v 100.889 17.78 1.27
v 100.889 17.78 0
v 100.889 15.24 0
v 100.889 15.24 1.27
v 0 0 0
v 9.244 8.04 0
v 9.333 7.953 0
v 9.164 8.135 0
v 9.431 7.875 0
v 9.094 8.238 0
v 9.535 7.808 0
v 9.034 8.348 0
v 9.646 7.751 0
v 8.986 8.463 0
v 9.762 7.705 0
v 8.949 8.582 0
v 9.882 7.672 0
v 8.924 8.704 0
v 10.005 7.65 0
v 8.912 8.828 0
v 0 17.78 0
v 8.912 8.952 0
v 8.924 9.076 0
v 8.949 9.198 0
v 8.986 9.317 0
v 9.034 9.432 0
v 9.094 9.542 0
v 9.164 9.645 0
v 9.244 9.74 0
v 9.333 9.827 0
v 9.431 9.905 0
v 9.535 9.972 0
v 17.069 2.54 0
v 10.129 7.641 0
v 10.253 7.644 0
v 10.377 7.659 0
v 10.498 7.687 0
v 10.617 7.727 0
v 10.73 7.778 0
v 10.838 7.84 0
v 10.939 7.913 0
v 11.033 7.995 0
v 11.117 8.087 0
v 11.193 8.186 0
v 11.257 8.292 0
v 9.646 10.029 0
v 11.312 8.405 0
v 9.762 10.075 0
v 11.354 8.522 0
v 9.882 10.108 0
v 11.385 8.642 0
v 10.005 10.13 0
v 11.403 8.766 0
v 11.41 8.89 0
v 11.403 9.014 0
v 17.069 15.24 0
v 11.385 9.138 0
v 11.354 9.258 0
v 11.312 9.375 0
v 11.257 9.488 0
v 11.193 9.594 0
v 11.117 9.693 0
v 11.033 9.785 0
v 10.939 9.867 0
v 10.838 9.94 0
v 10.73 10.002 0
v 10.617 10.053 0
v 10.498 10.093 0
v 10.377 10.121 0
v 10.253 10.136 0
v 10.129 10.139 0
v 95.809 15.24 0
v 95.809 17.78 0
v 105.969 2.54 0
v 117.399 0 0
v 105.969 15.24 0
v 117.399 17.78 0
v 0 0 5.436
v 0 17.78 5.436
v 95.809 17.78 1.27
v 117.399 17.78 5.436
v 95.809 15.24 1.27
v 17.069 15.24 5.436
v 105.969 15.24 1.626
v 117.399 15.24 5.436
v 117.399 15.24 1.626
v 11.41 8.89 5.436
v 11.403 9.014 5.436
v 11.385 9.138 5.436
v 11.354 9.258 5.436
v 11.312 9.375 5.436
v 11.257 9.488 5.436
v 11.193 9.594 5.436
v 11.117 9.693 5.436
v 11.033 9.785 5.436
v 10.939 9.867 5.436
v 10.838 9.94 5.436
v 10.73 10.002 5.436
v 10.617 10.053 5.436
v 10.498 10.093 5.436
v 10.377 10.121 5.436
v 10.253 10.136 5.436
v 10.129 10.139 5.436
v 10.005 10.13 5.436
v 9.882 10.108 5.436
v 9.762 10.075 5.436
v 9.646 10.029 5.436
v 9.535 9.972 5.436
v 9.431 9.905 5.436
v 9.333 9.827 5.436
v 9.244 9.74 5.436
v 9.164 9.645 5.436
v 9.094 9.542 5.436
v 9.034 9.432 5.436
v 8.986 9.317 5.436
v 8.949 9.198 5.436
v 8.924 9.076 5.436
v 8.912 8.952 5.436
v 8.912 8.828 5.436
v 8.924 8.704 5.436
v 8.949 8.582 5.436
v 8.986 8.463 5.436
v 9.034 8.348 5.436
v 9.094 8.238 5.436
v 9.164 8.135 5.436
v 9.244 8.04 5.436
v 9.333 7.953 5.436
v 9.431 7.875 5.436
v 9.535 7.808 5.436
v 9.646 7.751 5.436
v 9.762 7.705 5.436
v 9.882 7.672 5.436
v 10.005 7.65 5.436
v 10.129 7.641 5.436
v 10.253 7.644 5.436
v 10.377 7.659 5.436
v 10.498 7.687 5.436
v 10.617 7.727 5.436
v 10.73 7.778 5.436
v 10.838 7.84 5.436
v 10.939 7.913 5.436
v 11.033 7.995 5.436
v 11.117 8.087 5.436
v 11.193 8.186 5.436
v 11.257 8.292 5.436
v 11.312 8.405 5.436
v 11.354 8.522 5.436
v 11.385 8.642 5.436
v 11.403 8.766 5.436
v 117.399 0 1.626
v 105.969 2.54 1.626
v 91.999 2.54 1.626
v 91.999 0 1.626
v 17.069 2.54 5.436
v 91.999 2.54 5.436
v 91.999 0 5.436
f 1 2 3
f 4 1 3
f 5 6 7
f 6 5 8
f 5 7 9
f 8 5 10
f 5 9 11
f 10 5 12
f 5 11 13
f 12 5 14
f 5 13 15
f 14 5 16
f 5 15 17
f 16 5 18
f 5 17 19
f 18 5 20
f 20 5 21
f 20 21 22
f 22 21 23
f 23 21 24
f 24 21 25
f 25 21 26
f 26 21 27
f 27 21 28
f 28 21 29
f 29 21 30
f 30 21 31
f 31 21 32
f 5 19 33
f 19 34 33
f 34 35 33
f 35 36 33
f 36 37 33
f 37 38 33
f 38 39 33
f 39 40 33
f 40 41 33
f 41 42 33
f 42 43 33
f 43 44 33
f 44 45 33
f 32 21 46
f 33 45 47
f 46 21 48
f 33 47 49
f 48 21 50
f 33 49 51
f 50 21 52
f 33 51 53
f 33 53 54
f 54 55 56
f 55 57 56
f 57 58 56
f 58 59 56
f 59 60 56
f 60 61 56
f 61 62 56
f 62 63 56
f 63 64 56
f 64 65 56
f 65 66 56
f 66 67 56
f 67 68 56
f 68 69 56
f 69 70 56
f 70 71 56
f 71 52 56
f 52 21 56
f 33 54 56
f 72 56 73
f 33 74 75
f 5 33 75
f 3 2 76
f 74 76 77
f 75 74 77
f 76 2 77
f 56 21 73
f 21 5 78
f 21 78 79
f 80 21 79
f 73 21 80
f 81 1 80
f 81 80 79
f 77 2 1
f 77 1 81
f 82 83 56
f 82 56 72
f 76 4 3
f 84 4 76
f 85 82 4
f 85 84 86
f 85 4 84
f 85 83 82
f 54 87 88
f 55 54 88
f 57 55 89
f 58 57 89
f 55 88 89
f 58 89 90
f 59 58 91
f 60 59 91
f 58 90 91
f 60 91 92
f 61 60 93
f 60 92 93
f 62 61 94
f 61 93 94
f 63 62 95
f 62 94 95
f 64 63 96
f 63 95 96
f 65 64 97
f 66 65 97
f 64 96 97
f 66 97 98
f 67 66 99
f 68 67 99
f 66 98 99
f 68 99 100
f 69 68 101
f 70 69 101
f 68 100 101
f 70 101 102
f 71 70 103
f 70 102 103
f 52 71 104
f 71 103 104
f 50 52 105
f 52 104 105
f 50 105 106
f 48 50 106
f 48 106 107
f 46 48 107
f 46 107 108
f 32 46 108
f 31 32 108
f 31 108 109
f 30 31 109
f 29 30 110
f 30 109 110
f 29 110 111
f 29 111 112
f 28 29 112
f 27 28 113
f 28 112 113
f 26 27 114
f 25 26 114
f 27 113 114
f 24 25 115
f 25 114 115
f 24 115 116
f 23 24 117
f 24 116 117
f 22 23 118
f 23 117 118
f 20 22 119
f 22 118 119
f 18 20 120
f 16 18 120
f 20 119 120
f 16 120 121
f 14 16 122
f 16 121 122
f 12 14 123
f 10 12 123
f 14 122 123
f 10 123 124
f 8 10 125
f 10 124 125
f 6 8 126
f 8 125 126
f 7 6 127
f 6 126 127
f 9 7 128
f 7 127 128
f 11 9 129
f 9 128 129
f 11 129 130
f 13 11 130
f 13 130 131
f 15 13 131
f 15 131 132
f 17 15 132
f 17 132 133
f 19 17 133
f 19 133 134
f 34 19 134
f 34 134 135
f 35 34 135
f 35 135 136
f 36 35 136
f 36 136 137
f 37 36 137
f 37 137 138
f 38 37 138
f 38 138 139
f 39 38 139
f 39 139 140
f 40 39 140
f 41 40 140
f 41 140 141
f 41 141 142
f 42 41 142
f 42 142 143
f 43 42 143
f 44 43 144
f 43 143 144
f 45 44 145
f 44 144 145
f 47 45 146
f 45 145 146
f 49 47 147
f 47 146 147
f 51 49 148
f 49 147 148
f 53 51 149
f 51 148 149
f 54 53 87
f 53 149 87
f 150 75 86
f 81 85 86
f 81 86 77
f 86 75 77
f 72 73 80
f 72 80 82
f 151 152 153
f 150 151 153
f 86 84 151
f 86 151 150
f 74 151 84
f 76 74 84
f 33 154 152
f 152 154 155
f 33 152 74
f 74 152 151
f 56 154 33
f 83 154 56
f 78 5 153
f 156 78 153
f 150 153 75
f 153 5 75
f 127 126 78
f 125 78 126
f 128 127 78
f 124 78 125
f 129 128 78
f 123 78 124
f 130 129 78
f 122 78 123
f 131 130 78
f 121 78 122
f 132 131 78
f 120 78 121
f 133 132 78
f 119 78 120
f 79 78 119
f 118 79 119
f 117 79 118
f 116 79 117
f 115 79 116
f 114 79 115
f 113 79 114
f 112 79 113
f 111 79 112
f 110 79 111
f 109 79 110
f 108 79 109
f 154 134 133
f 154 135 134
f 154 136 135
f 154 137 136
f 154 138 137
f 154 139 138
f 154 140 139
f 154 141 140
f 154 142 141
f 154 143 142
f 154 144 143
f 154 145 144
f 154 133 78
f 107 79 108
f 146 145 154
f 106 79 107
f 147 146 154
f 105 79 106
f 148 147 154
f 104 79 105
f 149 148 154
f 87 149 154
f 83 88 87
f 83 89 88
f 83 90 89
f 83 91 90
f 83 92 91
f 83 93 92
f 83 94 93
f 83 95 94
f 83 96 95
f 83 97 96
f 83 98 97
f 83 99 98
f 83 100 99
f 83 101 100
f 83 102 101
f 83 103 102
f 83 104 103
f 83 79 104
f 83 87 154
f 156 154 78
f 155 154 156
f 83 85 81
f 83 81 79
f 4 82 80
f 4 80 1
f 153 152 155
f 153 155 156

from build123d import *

# Parameters (mm, degrees)
F0_W      = 117.3988
F0_H      = 17.78
F1_DEPTH  = 5.4356
F2_W      = 88.9
F2_H      = 12.7
F3_DEPTH  = 25.4
F4_W      = 11.43
F4_H      = 12.7
F5_DEPTH  = 3.81
F7_DEPTH  = 169
F8_R      = 1.24968
F9_DEPTH  = 5.4356
F10_W     = 5.08
F10_H     = 2.54
F11_DEPTH = 1.27


# Not quite as in the source:
# - an extrude ends at something that could not be found from the text; its depth is read off the source's solid


with BuildPart() as f1:
    # F0 (on Top) → F1 (new body)
    with BuildSketch(Plane.XY):
        with Locations((58.6994, 8.89)):
            Rectangle(F0_W, F0_H)
    extrude(amount=F1_DEPTH)

    # F2 (on face) → F3 (cut)
    with BuildSketch(Plane.XY.offset(5.4356)):
        with Locations((61.5188, 8.89)):
            Rectangle(F2_W, F2_H)
    extrude(amount=-F3_DEPTH, mode=Mode.SUBTRACT)

    # F4 (on face) → F5 (cut)
    with BuildSketch(Plane.XY.offset(5.4356)):
        with Locations((111.6838, 8.89)):
            Rectangle(F4_W, F4_H)
    extrude(amount=-F5_DEPTH, mode=Mode.SUBTRACT)

    # F6 (on face) → F7 (cut, through all)
    with BuildSketch(Plane.XY.offset(1.6256)):
        Polygon((105.9688, 2.54), (105.9688, 15.24), (91.9988, 15.24), (91.9988, 0), (117.3988, 0), (117.3988, 2.54), align=None)
    extrude(amount=F7_DEPTH, mode=Mode.SUBTRACT)

    # F8 (on face) → F9 (cut, through all)
    with BuildSketch(Plane.XY.offset(5.4356)):
        with Locations((10.16, 8.89)):
            Circle(F8_R)
    extrude(amount=-F9_DEPTH, mode=Mode.SUBTRACT)

    # F10 (on face) → F11 (cut)
    with BuildSketch(Plane(origin=(0, 0, 0), x_dir=(1, 0, 0), z_dir=(0, 0, -1))):
        with Locations((98.3488, -16.51)):
            Rectangle(F10_W, F10_H)
        Polygon((95.8088, -15.24), (100.8888, -15.24), (105.9688, -15.24), (105.9688, -2.54), (17.0688, -2.54), (17.0688, -15.24), align=None)
    extrude(amount=-F11_DEPTH, mode=Mode.SUBTRACT)


solid = f1.part
